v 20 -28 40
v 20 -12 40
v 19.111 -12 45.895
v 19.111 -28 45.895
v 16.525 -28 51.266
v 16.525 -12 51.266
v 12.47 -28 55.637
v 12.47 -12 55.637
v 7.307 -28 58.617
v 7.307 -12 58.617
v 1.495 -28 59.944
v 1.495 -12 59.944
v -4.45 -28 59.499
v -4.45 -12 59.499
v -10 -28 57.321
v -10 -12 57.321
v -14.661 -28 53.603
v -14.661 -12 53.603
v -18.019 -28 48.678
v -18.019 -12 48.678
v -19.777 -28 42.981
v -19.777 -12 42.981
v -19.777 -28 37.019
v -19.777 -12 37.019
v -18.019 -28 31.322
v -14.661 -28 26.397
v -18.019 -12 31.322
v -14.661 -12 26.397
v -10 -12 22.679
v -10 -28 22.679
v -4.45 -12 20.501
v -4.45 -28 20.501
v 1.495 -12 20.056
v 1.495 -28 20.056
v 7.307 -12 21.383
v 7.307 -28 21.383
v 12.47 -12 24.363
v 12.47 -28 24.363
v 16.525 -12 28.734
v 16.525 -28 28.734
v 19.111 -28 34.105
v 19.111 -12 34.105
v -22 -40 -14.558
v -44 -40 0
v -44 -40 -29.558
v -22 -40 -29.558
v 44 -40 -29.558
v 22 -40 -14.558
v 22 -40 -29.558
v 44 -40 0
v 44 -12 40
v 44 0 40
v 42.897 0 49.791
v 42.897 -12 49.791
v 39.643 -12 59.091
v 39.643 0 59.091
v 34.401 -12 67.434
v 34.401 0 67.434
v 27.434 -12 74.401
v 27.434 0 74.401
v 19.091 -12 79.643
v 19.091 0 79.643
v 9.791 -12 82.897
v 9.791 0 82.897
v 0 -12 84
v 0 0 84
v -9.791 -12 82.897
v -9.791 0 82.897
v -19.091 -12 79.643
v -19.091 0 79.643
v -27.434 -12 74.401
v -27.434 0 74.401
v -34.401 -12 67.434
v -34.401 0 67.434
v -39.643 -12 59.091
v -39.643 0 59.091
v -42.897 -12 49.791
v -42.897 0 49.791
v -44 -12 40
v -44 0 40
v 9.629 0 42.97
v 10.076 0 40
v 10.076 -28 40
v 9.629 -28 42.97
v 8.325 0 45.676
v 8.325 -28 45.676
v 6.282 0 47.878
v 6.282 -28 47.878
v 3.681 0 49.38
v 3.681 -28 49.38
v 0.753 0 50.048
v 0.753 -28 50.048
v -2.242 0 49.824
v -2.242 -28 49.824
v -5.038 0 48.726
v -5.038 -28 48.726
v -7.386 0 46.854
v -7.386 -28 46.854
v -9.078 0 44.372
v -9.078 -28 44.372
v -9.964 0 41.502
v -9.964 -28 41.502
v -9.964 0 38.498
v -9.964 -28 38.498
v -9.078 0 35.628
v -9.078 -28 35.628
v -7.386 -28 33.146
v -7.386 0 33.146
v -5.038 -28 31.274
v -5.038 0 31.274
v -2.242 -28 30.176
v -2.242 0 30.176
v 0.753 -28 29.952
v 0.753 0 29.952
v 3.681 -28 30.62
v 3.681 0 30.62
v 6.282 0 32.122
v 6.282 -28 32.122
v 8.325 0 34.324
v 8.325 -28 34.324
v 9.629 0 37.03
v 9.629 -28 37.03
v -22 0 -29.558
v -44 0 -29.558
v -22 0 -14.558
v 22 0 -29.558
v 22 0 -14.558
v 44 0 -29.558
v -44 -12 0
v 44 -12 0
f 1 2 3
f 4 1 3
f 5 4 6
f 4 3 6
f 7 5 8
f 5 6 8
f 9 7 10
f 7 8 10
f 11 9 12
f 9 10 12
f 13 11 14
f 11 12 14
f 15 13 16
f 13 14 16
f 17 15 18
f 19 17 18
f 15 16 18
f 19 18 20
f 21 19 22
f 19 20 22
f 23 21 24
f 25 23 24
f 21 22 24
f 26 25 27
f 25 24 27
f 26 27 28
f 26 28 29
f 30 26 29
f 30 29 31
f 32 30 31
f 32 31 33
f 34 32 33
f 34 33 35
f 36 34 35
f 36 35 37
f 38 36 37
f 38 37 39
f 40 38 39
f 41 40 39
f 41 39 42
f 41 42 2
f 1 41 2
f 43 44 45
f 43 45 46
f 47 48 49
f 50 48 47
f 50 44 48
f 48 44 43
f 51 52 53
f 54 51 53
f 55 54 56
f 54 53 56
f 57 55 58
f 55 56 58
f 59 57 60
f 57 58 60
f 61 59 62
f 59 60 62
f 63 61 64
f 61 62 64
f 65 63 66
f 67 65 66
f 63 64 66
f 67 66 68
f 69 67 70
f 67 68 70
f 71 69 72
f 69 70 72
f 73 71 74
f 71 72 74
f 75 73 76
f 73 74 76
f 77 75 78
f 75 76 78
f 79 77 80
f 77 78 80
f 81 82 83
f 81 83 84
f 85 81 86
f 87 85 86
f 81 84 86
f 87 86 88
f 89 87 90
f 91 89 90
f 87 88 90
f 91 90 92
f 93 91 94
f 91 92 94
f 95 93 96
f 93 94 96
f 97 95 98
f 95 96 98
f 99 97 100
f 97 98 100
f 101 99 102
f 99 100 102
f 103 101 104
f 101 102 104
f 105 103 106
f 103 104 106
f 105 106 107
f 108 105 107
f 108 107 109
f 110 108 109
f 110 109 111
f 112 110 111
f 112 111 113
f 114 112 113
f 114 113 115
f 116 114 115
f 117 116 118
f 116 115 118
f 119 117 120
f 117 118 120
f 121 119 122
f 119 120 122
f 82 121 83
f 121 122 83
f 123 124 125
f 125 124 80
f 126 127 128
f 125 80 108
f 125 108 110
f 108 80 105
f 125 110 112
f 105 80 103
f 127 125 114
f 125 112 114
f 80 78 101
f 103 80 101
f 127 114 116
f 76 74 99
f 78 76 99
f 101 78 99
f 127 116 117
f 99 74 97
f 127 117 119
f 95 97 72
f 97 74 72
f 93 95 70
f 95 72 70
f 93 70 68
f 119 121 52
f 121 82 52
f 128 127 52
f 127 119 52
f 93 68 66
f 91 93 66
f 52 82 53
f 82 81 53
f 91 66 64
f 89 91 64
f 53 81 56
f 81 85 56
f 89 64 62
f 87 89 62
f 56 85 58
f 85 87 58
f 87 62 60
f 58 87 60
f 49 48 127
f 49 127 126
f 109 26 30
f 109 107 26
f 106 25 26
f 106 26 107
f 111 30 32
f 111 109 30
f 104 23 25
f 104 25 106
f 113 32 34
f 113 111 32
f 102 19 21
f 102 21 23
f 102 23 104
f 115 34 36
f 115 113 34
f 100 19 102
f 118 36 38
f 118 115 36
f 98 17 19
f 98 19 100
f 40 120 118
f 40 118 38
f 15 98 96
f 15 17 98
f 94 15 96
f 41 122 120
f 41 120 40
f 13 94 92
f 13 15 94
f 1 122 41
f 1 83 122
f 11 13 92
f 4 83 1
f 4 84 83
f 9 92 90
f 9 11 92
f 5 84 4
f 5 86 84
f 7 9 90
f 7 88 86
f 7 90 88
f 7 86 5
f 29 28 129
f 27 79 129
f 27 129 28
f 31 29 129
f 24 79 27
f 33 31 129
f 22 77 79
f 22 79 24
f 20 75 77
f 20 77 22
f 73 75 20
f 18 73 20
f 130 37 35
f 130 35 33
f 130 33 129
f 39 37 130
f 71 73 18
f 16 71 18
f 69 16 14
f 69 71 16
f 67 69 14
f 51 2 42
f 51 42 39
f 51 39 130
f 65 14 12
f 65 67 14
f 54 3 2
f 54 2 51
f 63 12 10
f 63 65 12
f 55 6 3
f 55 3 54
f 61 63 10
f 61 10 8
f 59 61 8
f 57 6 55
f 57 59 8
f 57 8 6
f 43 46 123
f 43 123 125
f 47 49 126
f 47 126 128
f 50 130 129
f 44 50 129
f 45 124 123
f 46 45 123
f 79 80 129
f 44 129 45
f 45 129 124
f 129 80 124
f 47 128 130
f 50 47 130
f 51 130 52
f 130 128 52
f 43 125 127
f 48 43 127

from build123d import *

# Parameters (mm, degrees)
F1_DEPTH  = 12
F3_DEPTH  = 40
F4_R      = 20
F4_R_2    = 10.076215
F5_DEPTH  = 28
F5_FACE_R = 10.076215
F6_DEPTH  = 25


with BuildPart() as f1:
    # F0 (on Front) → F1 (new body)
    with BuildSketch(Plane.XZ):
        with BuildLine():
            Line((-44, 40), (-44, 0))
            Line((-44, 0), (44, 0))
            Line((44, 0), (44, 40))
            ThreePointArc((44, 40), (0, 84), (-44, 40))
        make_face()
    extrude(amount=F1_DEPTH)

    # F2 (on Front) → F3 (join)
    with BuildSketch(Plane.XZ):
        Polygon((44, 0), (-44, 0), (-44, -29.557653), (-22, -29.557653), (-22, -14.557653), (22, -14.557653), (22, -29.557653), (44, -29.557653), align=None)
    extrude(amount=F3_DEPTH)

    # F4 (on Front) → F5 (join)
    with BuildSketch(Plane.XZ):
        with Locations((0, 40)):
            Circle(F4_R)
        with Locations((0, 40)):
            Circle(F4_R_2, mode=Mode.SUBTRACT)
    extrude(amount=F5_DEPTH)

    # F5_face (on face) → F6 (cut)
    with BuildSketch(Plane(origin=(0, -12, 40), x_dir=(1, 0, 0), z_dir=(0, -1, 0))):
        Circle(F5_FACE_R)
    extrude(amount=-F6_DEPTH, mode=Mode.SUBTRACT)


solid = f1.part
